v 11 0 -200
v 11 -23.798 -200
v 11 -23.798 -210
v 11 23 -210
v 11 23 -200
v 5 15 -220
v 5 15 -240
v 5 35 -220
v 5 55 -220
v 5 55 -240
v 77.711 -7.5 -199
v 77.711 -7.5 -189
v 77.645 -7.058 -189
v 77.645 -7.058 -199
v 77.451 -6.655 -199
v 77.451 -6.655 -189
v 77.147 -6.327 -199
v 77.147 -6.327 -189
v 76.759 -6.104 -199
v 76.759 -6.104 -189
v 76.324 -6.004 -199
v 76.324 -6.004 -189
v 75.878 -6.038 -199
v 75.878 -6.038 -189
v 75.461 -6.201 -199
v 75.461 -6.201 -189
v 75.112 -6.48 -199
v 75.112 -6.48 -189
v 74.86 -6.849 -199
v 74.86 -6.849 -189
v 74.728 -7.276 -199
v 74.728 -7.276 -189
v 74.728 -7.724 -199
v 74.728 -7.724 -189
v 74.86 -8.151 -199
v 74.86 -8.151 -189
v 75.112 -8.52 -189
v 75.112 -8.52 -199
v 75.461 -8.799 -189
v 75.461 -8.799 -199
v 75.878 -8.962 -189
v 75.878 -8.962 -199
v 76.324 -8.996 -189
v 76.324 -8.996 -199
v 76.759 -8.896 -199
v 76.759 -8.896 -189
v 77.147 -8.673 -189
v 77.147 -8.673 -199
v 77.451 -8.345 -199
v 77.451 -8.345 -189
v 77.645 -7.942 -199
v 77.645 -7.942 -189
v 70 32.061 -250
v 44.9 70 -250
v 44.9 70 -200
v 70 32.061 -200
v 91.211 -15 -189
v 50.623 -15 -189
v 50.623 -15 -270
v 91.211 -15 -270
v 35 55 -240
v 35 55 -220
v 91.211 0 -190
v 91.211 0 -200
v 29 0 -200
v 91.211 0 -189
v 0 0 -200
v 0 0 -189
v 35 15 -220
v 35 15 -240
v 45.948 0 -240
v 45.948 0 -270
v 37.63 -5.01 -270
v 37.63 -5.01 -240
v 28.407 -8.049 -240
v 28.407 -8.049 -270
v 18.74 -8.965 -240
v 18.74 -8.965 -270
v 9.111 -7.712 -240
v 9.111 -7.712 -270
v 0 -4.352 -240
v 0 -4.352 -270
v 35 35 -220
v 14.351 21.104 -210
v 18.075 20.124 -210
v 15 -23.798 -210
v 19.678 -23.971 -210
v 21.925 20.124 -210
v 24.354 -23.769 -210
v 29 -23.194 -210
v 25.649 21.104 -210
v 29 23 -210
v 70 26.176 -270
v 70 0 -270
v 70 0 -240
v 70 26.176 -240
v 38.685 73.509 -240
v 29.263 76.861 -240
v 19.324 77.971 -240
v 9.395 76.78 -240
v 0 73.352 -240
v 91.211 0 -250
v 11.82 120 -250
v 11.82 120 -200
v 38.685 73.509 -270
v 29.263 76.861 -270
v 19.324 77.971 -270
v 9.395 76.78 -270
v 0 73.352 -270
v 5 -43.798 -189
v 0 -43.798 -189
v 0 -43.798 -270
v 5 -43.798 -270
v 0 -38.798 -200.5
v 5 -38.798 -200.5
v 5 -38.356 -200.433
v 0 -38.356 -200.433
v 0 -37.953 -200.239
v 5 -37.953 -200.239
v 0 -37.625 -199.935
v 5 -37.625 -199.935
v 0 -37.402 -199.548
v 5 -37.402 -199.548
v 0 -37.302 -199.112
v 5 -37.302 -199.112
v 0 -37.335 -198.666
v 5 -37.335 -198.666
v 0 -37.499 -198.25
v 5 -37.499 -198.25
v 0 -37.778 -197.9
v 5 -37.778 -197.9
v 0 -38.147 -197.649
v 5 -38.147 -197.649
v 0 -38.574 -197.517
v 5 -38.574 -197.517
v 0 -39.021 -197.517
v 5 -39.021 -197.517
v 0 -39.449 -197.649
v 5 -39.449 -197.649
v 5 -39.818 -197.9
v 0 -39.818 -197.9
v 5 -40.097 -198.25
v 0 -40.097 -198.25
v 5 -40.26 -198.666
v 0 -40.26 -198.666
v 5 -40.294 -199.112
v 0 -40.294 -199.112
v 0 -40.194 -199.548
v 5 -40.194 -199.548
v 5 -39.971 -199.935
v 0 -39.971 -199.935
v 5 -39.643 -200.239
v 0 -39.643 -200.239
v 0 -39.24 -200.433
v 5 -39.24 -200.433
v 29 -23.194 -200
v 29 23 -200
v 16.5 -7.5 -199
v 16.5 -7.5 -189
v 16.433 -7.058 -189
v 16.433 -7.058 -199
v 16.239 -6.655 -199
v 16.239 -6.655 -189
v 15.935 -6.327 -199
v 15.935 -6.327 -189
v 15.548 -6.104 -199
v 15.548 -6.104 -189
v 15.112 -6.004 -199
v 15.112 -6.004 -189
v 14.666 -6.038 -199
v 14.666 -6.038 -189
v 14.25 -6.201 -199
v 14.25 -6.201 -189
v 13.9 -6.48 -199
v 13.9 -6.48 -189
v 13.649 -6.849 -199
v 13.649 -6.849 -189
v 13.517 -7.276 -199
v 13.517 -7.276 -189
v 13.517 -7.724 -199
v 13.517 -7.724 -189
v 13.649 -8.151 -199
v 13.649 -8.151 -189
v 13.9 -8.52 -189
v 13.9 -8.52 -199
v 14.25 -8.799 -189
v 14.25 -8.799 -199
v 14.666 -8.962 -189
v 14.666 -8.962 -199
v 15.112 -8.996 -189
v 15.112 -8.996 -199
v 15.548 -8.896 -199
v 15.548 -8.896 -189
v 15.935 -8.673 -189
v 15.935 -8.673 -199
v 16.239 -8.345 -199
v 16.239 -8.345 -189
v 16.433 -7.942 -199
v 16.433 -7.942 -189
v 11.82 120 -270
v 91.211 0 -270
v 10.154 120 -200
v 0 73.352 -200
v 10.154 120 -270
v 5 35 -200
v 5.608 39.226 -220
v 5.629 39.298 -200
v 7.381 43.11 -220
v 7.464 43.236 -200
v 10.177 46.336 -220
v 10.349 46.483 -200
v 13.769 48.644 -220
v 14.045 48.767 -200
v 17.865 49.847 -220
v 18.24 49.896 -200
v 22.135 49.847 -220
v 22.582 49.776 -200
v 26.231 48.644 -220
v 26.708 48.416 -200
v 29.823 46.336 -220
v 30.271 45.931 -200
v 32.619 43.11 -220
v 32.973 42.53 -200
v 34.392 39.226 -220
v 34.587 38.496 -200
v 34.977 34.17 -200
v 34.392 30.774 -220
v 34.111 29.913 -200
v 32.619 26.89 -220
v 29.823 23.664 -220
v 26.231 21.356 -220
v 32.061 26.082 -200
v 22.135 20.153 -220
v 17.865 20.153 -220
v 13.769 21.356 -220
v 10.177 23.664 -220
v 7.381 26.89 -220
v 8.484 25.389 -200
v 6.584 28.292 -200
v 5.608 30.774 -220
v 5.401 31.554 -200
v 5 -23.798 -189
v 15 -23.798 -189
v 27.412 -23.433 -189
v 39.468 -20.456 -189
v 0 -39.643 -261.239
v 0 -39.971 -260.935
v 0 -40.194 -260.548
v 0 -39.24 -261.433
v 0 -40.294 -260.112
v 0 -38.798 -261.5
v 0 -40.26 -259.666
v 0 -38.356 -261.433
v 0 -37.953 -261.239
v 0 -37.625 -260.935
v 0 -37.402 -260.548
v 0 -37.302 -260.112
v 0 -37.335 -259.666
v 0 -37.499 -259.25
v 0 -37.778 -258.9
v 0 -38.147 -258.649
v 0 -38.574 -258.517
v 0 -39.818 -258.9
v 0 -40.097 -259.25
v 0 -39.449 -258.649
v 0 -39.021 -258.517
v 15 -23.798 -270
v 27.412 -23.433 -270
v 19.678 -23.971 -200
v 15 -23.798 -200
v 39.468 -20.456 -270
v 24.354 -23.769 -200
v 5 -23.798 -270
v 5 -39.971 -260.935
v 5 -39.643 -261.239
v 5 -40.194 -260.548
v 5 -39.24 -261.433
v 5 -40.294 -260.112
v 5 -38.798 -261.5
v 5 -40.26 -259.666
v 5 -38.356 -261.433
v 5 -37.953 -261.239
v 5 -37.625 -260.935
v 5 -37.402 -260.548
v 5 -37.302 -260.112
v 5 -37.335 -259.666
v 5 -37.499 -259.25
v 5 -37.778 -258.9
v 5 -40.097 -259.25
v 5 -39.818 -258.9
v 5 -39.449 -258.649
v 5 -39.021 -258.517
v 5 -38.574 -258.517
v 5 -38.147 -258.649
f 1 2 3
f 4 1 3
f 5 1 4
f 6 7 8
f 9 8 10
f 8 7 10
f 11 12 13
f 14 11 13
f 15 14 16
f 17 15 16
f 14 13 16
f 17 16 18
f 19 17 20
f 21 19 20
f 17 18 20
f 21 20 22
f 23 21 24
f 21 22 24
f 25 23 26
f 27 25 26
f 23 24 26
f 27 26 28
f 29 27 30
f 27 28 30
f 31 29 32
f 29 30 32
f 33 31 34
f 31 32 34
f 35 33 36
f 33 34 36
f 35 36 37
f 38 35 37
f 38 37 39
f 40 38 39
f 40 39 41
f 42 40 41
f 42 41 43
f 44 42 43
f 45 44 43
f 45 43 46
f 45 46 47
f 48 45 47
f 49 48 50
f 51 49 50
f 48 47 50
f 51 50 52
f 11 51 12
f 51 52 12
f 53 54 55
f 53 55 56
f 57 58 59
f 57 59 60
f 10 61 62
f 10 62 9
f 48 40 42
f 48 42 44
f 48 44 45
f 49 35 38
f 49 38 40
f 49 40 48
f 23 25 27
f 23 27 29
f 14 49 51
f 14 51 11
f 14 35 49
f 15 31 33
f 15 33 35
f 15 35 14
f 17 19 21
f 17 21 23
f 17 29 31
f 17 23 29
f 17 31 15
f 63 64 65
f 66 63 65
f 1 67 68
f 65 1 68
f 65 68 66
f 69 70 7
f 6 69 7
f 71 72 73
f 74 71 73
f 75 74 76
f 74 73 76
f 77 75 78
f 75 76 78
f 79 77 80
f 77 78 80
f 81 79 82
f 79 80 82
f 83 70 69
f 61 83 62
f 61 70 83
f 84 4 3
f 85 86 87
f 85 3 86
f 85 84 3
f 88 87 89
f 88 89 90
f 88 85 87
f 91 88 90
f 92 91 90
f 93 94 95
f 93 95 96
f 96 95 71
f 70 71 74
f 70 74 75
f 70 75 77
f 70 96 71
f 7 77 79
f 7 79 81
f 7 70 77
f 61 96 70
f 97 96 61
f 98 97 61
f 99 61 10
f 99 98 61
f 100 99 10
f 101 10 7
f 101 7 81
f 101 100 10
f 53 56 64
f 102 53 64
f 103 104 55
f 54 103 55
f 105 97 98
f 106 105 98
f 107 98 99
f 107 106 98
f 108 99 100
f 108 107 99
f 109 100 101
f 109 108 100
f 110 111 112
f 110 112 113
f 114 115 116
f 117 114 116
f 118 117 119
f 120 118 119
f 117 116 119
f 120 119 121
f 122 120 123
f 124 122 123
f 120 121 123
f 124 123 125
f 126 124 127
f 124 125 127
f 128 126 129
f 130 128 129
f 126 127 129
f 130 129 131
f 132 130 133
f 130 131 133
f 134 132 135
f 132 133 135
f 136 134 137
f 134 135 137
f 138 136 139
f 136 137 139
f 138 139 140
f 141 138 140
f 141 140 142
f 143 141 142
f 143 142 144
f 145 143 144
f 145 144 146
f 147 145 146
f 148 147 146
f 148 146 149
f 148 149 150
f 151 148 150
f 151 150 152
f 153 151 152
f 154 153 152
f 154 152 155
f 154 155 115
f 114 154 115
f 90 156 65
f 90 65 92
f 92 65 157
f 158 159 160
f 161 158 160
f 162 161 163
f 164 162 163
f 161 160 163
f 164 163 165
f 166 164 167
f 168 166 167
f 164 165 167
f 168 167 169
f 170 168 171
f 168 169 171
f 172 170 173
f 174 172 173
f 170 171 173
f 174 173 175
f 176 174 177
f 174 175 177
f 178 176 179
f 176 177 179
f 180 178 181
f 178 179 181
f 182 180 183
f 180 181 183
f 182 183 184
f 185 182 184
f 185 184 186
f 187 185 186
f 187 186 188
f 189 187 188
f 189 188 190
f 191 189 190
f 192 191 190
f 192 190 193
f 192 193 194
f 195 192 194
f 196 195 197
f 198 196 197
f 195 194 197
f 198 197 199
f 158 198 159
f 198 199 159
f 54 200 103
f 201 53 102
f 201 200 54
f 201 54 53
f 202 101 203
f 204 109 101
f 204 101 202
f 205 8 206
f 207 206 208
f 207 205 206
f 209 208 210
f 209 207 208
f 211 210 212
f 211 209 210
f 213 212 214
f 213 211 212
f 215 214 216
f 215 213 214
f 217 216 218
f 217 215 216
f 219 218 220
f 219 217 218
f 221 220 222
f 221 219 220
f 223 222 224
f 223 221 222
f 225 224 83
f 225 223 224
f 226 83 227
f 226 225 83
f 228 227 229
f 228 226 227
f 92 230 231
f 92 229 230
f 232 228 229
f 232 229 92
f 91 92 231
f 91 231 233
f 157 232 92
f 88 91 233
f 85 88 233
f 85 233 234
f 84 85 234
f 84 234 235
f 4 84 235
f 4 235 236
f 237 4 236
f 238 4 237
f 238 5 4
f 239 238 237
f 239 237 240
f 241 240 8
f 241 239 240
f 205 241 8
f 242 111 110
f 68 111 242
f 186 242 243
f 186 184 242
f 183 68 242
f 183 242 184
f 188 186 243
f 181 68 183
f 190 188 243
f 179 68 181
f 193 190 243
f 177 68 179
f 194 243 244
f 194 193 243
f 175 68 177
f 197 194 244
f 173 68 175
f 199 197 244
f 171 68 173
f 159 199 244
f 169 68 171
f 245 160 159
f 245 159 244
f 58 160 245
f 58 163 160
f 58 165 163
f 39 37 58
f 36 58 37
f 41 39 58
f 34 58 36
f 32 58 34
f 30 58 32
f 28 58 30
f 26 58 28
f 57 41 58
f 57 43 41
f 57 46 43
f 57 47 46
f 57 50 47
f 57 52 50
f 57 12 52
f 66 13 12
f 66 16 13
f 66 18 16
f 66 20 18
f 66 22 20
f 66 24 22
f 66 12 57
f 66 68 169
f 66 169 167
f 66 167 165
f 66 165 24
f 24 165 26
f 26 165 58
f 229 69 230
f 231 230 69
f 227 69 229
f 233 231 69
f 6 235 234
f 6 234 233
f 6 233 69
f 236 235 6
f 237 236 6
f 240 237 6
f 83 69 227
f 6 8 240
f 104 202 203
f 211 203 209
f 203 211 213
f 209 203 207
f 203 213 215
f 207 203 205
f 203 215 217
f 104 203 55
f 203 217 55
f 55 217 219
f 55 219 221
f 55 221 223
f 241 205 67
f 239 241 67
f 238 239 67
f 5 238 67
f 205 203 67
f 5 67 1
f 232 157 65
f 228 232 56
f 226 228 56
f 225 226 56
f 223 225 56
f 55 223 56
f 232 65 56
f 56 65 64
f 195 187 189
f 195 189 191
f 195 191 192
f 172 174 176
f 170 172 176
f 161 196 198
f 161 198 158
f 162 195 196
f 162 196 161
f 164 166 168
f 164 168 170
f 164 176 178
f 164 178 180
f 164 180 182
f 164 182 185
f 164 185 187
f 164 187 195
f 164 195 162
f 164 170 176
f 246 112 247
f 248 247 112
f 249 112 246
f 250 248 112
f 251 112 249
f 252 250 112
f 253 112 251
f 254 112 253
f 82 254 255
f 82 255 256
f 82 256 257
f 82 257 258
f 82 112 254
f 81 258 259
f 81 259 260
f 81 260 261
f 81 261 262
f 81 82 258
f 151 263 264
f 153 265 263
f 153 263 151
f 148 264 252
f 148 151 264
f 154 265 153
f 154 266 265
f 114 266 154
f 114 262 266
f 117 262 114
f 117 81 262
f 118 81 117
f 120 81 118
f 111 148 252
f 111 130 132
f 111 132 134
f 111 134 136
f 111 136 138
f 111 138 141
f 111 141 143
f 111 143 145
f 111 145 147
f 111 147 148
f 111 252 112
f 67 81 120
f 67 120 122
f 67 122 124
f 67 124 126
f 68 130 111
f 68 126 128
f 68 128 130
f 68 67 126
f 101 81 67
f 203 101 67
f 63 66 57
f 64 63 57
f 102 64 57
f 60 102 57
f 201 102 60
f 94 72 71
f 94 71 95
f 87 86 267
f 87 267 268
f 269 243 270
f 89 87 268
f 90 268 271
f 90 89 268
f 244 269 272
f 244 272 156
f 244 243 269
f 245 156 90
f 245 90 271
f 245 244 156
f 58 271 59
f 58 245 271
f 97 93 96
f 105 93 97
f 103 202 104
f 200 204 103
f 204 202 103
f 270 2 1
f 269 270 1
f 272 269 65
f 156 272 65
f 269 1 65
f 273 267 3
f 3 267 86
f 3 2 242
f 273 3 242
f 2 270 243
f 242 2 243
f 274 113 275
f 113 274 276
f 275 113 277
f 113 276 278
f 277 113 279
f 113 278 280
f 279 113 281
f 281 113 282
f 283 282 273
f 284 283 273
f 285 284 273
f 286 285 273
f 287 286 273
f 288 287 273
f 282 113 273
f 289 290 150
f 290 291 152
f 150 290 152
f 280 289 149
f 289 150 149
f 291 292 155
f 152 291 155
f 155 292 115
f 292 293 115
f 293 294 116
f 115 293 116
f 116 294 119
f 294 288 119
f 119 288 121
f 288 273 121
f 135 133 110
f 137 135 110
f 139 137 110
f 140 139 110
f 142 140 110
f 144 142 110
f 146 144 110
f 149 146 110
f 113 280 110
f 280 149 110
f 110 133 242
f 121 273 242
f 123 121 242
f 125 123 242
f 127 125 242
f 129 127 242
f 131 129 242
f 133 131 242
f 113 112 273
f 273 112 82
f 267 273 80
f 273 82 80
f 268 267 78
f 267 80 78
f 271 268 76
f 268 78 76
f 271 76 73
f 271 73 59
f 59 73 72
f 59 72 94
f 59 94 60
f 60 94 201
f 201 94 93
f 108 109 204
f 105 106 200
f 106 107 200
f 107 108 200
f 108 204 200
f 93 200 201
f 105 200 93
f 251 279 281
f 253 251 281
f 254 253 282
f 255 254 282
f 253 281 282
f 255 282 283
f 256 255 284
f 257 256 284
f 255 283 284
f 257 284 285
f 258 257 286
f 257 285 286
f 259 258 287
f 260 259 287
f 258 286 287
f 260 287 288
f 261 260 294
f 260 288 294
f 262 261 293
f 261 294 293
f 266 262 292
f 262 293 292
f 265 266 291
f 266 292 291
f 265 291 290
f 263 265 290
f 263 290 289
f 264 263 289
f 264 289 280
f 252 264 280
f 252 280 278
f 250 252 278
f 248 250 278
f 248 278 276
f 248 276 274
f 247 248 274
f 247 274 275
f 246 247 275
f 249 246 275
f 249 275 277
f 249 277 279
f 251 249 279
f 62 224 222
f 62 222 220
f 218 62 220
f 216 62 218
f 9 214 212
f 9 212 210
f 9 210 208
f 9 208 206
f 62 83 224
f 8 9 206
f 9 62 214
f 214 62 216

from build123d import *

# Parameters (mm, degrees)
EXTRUDE_1_DEPTH           = 30
EXTRUDE_2_DEPTH           = 210
SKETCH_8_W                = 25
SKETCH_8_H                = 120
EXTRUDE_5_DEPTH           = 70
SKETCH_9_W                = 25
SKETCH_9_H                = 60
EXTRUDE_6_DEPTH           = 60
SKETCH_10_R               = 7.5
CUT_EXTRUDE_3_DEPTH       = 402.372644808
EXTRUDE_7_DEPTH           = 60
EXTRUDE_8_REACH           = 392.16
SKETCH_12_R               = 2.5
SKETCH_14_W               = 125
SKETCH_14_H               = 50
EXTRUDE_9_DEPTH           = 120
SKETCH_15_W               = 70
SKETCH_15_H               = 70
CUT_EXTRUDE_4_DEPTH       = 10
CUT_EXTRUDE_5_DEPTH       = 20
SKETCH_17_R               = 43.471266984
CUT_EXTRUDE_6_DEPTH       = 428.317212384
EXTRUDE_10_DEPTH          = 20
EXTRUDE_11_DEPTH          = 20
CUT_EXTRUDE_7_DEPTH       = 434.012701892
CUT_EXTRUDE_8_DEPTH       = 434.012701892
EXTRUDE_19_REACH          = 446.86
EXTRUDE_20_DEPTH          = 20
EXTRUDE_21_DEPTH          = 20
EXTRUDE_START             = 20
EXTRUDE_22_DEPTH          = 20
CUT_EXTRUDE_9_DEPTH       = 30
CUT_EXTRUDE_11_DEPTH      = 407.201920232
CUT_EXTRUDE_11_DEPTH_BACK = 407.201920232
SKETCH_29_R               = 15
EXTRUDE_23_DEPTH          = 78.203243
SKETCH_33_W               = 30
SKETCH_33_H               = 40
CUT_EXTRUDE_14_DEPTH      = 20
SKETCH_34_W               = 18
SKETCH_34_H               = 35.300600551
CUT_EXTRUDE_15_DEPTH      = 10
CUT_EXTRUDE_16_DEPTH      = 10
SKETCH_36_RX              = 24.05
SKETCH_36_RY              = 15.9
SKETCH_36_R               = 15.9
CUT_EXTRUDE_17_DEPTH      = 4
SKETCH_37_W               = 148.788525811
SKETCH_37_H               = 80
CUT_EXTRUDE_18_DEPTH      = 445.859528391
SKETCH_38_W               = 76.211474189
SKETCH_38_H               = 51.3
CUT_EXTRUDE_20_DEPTH      = 80
CUT_EXTRUDE_START         = -81
CUT_EXTRUDE_21_DEPTH      = 81
CUT_EXTRUDE_22_DEPTH      = 402.372644808
SKETCH_41_W               = 18
SKETCH_41_H               = 10
CUT_EXTRUDE_23_DEPTH      = 60
SKETCH_44_W               = 50
SKETCH_44_H               = 109
EXTRUDE_26_DEPTH          = 15
SKETCH_45_W               = 50
SKETCH_45_H               = 109
EXTRUDE_27_DEPTH          = 15
EXTRUDE_28_DEPTH          = 15
SKETCH_47_W               = 15
SKETCH_47_H               = 50.339258453
CUT_EXTRUDE_24_DEPTH      = 109
CUT_EXTRUDE_27_DEPTH      = 400.249295554
CUT_EXTRUDE_27_DEPTH_BACK = 400.249295554
CUT_EXTRUDE_28_DEPTH      = 435.539986653
CUT_EXTRUDE_28_DEPTH_BACK = 435.539986653
CUT_EXTRUDE_29_DEPTH      = 323.795419456
CUT_EXTRUDE_29_DEPTH_BACK = 15
SKETCH_56_W               = 81
SKETCH_56_H               = 139.588324269
SKETCH_57_W               = 5
SKETCH_57_H               = 81
EXTRUDE_30_DEPTH          = 20
SKETCH_58_R               = 1.5
CUT_EXTRUDE_30_DEPTH      = 20
SKETCH_59_R               = 1.5
CUT_EXTRUDE_31_DEPTH      = 10


with BuildPart() as part:
    # 草图1 → 凸台-拉伸1 (new body)
    with BuildSketch(Plane(origin=(0, 0, 0), x_dir=(0, 0, -1), z_dir=(1, 0, 0))):
        with BuildLine():
            Line((0, 0), (270, 0))
            Line((270, 0), (270, -100.282814983))
            ThreePointArc((270, -100.282814983), (264.178138298, -118.691056762), (248.830033233, -130.404003019))
            Line((248.830033233, -130.404003019), (142.45524498, -168.69892679))
            ThreePointArc((142.45524498, -168.69892679), (135, -170), (127.54475502, -168.69892679))
            Line((127.54475502, -168.69892679), (21.169966767, -130.404003019))
            ThreePointArc((21.169966767, -130.404003019), (5.821861702, -118.691056762), (0, -100.282814983))
            Line((0, -100.282814983), (0, 0))
        make_face()
    extrude(amount=EXTRUDE_1_DEPTH)

    # 草图2 → 凸台-拉伸2 (add)
    with BuildSketch(Plane(origin=(30, 0, 0), x_dir=(0, 0, -1), z_dir=(1, 0, 0))):
        with BuildLine():
            Line((105, -160.582814983), (105, 0))
            Line((105, 0), (0, 0))
            Line((0, 0), (0, -100.282814983))
            ThreePointArc((0, -100.282814983), (5.821861702, -118.691056762), (21.169966767, -130.404003019))
            Line((21.169966767, -130.404003019), (105, -160.582814983))
        make_face()
        with BuildLine():
            Line((270, 0), (165, 0))
            Line((165, 0), (165, -160.582814983))
            Line((165, -160.582814983), (248.830033233, -130.404003019))
            ThreePointArc((248.830033233, -130.404003019), (264.178138298, -118.691056762), (270, -100.282814983))
            Line((270, -100.282814983), (270, 0))
        make_face()
    extrude(amount=EXTRUDE_2_DEPTH)

    # 草图8 → 凸台-拉伸5 (add)
    with BuildSketch(Plane(origin=(240, 0, 0), x_dir=(0, 0, -1), z_dir=(1, 0, 0))):
        with Locations((92.5, 0)):
            Rectangle(SKETCH_8_W, SKETCH_8_H)
        with Locations((177.5, 0)):
            Rectangle(SKETCH_8_W, SKETCH_8_H)
    extrude(amount=EXTRUDE_5_DEPTH)

    # 草图9 → 凸台-拉伸6 (add)
    with BuildSketch(Plane.ZY.offset(-240)):
        with Locations((-92.5, 30)):
            Rectangle(SKETCH_9_W, SKETCH_9_H)
        with Locations((-177.5, 30)):
            Rectangle(SKETCH_9_W, SKETCH_9_H)
    extrude(amount=EXTRUDE_6_DEPTH)

    # 草图10 → 切除-拉伸3 (cut, through all)
    with BuildSketch(Plane.XY.offset(-80)):
        with Locations((270, 30)):
            Circle(SKETCH_10_R)
    extrude(amount=-CUT_EXTRUDE_3_DEPTH, mode=Mode.SUBTRACT)

    # 草图11 → 凸台-拉伸7 (add)
    with BuildSketch(Plane(origin=(0, 0, -105), x_dir=(-1, 0, 0), z_dir=(0, 0, -1))):
        with BuildLine():
            Line((-30, -40), (-30, -160.582814983))
            Line((-30, -160.582814983), (-108.203242822, -160.582814983))
            ThreePointArc((-108.203242822, -160.582814983), (-60.24964282, -106.032303748), (-30, -40))
        make_face()
    extrude(amount=EXTRUDE_7_DEPTH)

    # 草图12 → 凸台-拉伸8 (add, up to next)
    with BuildSketch(Plane.XY.offset(-165), mode=Mode.PRIVATE) as extrude_8_sk1:
        with Locations(Location((70, -45, 0), (0, 0, 180))):
            Circle(SKETCH_12_R)
    extrude_8_tool1 = extrude(extrude_8_sk1.sketch, amount=EXTRUDE_8_REACH, mode=Mode.PRIVATE) - part.part
    add(extrude_8_tool1.solids().sort_by_distance((70, -45, -165))[0])

    # 草图14 → 凸台-拉伸9 (add)
    with BuildSketch(Plane(origin=(0, 0, 0), x_dir=(1, 0, 0), z_dir=(0, 1, 0))):
        with Locations((62.5, 225)):
            Rectangle(SKETCH_14_W, SKETCH_14_H)
        with Locations((62.5, 45)):
            Rectangle(SKETCH_14_W, SKETCH_14_H)
    extrude(amount=EXTRUDE_9_DEPTH)

    # 草图15 → 切除-拉伸4 (cut)
    with BuildSketch(Plane.XY.offset(-20)):
        with Locations((35, 35)):
            Rectangle(SKETCH_15_W, SKETCH_15_H)
    extrude(amount=-CUT_EXTRUDE_4_DEPTH, mode=Mode.SUBTRACT)

    # 草图16 → 切除-拉伸5 (cut)
    with BuildSketch(Plane.XY.offset(-30)):
        Polygon((35, 15), (5, 15), (5, 55), (35, 55), (35, 35), align=None)
    extrude(amount=-CUT_EXTRUDE_5_DEPTH, mode=Mode.SUBTRACT)

    # 草图17 → 切除-拉伸6 (cut, through all)
    with BuildSketch(Plane.XY.offset(-30)):
        with Locations((19.5, 34.5)):
            Circle(SKETCH_17_R)
    extrude(amount=CUT_EXTRUDE_6_DEPTH, mode=Mode.SUBTRACT)

    # 草图18 → 凸台-拉伸10 (add)
    with BuildSketch(Plane.XY.offset(-20)):
        Polygon((11.819921283, 120), (91.211474189, 0), (87.317867735, 0), (10.741661946, 115.744614613), align=None)
    extrude(amount=EXTRUDE_10_DEPTH)

    # 草图19 → 凸台-拉伸11 (add)
    with BuildSketch(Plane.XY.offset(-20)):
        with BuildLine():
            Line((1.857343832, 74.230186717), (10.856035233, 115.571739869))
            Line((10.856035233, 115.571739869), (10.741661946, 115.744614613))
            Line((10.741661946, 115.744614613), (11.819921283, 120))
            Line((11.819921283, 120), (10.153664863, 120))
            Line((10.153664863, 120), (0, 73.352297914))
            ThreePointArc((0, 73.352297914), (0.923485284, 73.80221564), (1.857343832, 74.230186717))
        make_face()
    extrude(amount=EXTRUDE_11_DEPTH)

    # 草图20 → 切除-拉伸7 (cut, through all)
    with BuildSketch(Plane.XY.offset(-20)):
        Polygon((0, 120), (0, 73.352297914), (10.153664863, 120), align=None)
    extrude(amount=-CUT_EXTRUDE_7_DEPTH, mode=Mode.SUBTRACT)

    # 草图22 → 切除-拉伸8 (cut, through all)
    with BuildSketch(Plane.XY.offset(-20)):
        Polygon((44.899734993, 70), (70, 32.061054476), (91.211474189, 0), (125, 0), (125, 120), (11.819921283, 120), align=None)
    extrude(amount=-CUT_EXTRUDE_8_DEPTH, mode=Mode.SUBTRACT)

    # 草图23 → 凸台-拉伸19 (add, up to next)
    with BuildSketch(Plane.XY, mode=Mode.PRIVATE) as extrude_19_sk1:
        with BuildLine():
            Line((87.317867735, 0), (91.211474189, 0))
            Line((91.211474189, 0), (11.819921283, 120))
            Line((11.819921283, 120), (10.153664863, 120))
            Line((10.153664863, 120), (0, 73.352297914))
            ThreePointArc((0, 73.352297914), (0.923485284, 73.80221564), (1.857343832, 74.230186717))
            Line((1.857343832, 74.230186717), (10.856035233, 115.571739869))
            Line((10.856035233, 115.571739869), (87.317867735, 0))
        make_face()
    extrude_19_tool1 = extrude(extrude_19_sk1.sketch, amount=-EXTRUDE_19_REACH, mode=Mode.PRIVATE) - part.part
    add(extrude_19_tool1.solids().sort_by_distance((89.264671, 1.5073, 0))[0])

    # 草图24 → 凸台-拉伸20 (add)
    with BuildSketch(Plane.XY.offset(-20)):
        Polygon((87.317867735, 0), (70, 26.175884614), (70, 0), align=None)
    extrude(amount=EXTRUDE_20_DEPTH)

    # 草图25 → 凸台-拉伸21 (add)
    with BuildSketch(Plane.XY.offset(-20)):
        with BuildLine():
            Line((38.684579851, 73.509011127), (10.856035233, 115.571739869))
            Line((10.856035233, 115.571739869), (1.857343832, 74.230186717))
            ThreePointArc((1.857343832, 74.230186717), (20.351120273, 77.962934179), (38.684579851, 73.509011127))
        make_face()
    extrude(amount=EXTRUDE_21_DEPTH)

    # 草图26 → 凸台-拉伸22 (add)
    with BuildSketch(Plane(origin=(0, 0, -250), x_dir=(-1, 0, 0), z_dir=(0, 0, -1)).offset(EXTRUDE_START)):
        with BuildLine():
            Line((-70, 26.175884614), (-38.684579851, 73.509011127))
            ThreePointArc((-38.684579851, 73.509011127), (-19.323897117, 77.970910285), (0, 73.352297914))
            Line((0, 73.352297914), (-10.153664863, 120))
            Line((-10.153664863, 120), (-11.819921283, 120))
            Line((-11.819921283, 120), (-91.211474189, 0))
            Line((-91.211474189, 0), (-240, 0))
            Line((-240, 0), (-240, -100.282814983))
            Line((-240, -100.282814983), (0, -100.282814983))
            Line((0, -100.282814983), (0, -4.352297914))
            ThreePointArc((0, -4.352297914), (-23.599339693, -8.77755154), (-45.948082222, 0))
            Line((-45.948082222, 0), (-70, 0))
            Line((-70, 0), (-70, 26.175884614))
        make_face()
    extrude(amount=-EXTRUDE_22_DEPTH)

    # 草图27 → 切除-拉伸9 (cut)
    with BuildSketch(Plane(origin=(0, 0, -270), x_dir=(-1, 0, 0), z_dir=(0, 0, -1))):
        with BuildLine():
            Line((-38.684579851, 73.509011127), (-70, 26.175884614))
            Line((-70, 26.175884614), (-70, 0))
            Line((-70, 0), (-45.948082222, 0))
            ThreePointArc((-45.948082222, 0), (-23.599339693, -8.77755154), (0, -4.352297914))
            Line((0, -4.352297914), (0, 73.352297914))
            ThreePointArc((0, 73.352297914), (-19.323897117, 77.970910285), (-38.684579851, 73.509011127))
        make_face()
    extrude(amount=-CUT_EXTRUDE_9_DEPTH, mode=Mode.SUBTRACT)

    # 草图29 → 切除-拉伸11 (cut, two sides: drawn at the far end of the back side and taken through both)
    with BuildSketch(Plane(origin=(0, 0, -70), x_dir=(-1, 0, 0), z_dir=(0, 0, -1)).offset(-CUT_EXTRUDE_11_DEPTH_BACK)):
        with Locations((-20, 35)):
            Circle(SKETCH_29_R)
    extrude(amount=CUT_EXTRUDE_11_DEPTH + CUT_EXTRUDE_11_DEPTH_BACK, mode=Mode.SUBTRACT)

    # 草图30 → 凸台-拉伸23 (add)
    with BuildSketch(Plane(origin=(30, 0, 0), x_dir=(0, 0, -1), z_dir=(1, 0, 0))):
        with BuildLine():
            Line((142.45524498, -168.69892679), (165, -160.582814983))
            Line((165, -160.582814983), (105, -160.582814983))
            Line((105, -160.582814983), (127.54475502, -168.69892679))
            ThreePointArc((127.54475502, -168.69892679), (135, -170), (142.45524498, -168.69892679))
        make_face()
    extrude(amount=EXTRUDE_23_DEPTH)

    # 草图33 → 切除-拉伸14 (cut)
    with BuildSketch(Plane(origin=(0, 0, -240), x_dir=(-1, 0, 0), z_dir=(0, 0, -1))):
        with Locations((-20, 35)):
            Rectangle(SKETCH_33_W, SKETCH_33_H)
    extrude(amount=-CUT_EXTRUDE_14_DEPTH, mode=Mode.SUBTRACT)

    # 草图34 → 切除-拉伸15 (cut)
    with BuildSketch(Plane.XY.offset(-200)):
        with Locations((20, 17.650300276)):
            Rectangle(SKETCH_34_W, SKETCH_34_H)
    extrude(amount=-CUT_EXTRUDE_15_DEPTH, mode=Mode.SUBTRACT)

    # 草图35 → 切除-拉伸16 (cut)
    with BuildSketch(Plane(origin=(0, 0, -70), x_dir=(-1, 0, 0), z_dir=(0, 0, -1))):
        with BuildLine():
            Line((-11, 0), (-11, 23))
            ThreePointArc((-11, 23), (-20, 20), (-29, 23))
            Line((-29, 23), (-29, 0))
            Line((-29, 0), (-11, 0))
        make_face()
    extrude(amount=-CUT_EXTRUDE_16_DEPTH, mode=Mode.SUBTRACT)

    # 草图36 → 切除-拉伸17 (cut)
    # profile 1 of 6: a face of its own
    with BuildSketch(Plane.ZY):
        with Locations((-235.69166945, -100.008005659)):
            Ellipse(SKETCH_36_RX, SKETCH_36_RY)
        with Locations((-235.69166945, -100.008005659)):
            Circle(SKETCH_36_R, mode=Mode.SUBTRACT)
    # profile 2 of 6: a face of its own
    with BuildSketch(Plane.ZY):
        with Locations((-235.69166945, -100.008005659)):
            Ellipse(SKETCH_36_RX, SKETCH_36_RY)
        with Locations((-235.69166945, -100.008005659)):
            Circle(SKETCH_36_R, mode=Mode.SUBTRACT)
    # profile 3 of 6: a face of its own
    with BuildSketch(Plane.ZY):
        with Locations((-235.69166945, -100.008005659)):
            Circle(SKETCH_36_R)
    # profile 4 of 6: a face of its own
    with BuildSketch(Plane.ZY):
        with Locations(Location((-34.30833055, -100.008005659), (0, 0, 180))):
            Ellipse(SKETCH_36_RX, SKETCH_36_RY)
        with Locations((-34.30833055, -100.008005659)):
            Circle(SKETCH_36_R, mode=Mode.SUBTRACT)
    # profile 5 of 6: a face of its own
    with BuildSketch(Plane.ZY):
        with Locations(Location((-34.30833055, -100.008005659), (0, 0, 180))):
            Ellipse(SKETCH_36_RX, SKETCH_36_RY)
        with Locations((-34.30833055, -100.008005659)):
            Circle(SKETCH_36_R, mode=Mode.SUBTRACT)
    # profile 6 of 6: a face of its own
    with BuildSketch(Plane.ZY):
        with Locations((-34.30833055, -100.008005659)):
            Circle(SKETCH_36_R)
    extrude(amount=-CUT_EXTRUDE_17_DEPTH, mode=Mode.SUBTRACT)

    # 草图37 → 切除-拉伸18 (cut, through all)
    with BuildSketch(Plane(origin=(0, 0, 0), x_dir=(1, 0, 0), z_dir=(0, 1, 0))):
        with Locations((165.605737095, 40)):
            Rectangle(SKETCH_37_W, SKETCH_37_H)
        with Locations((165.605737095, 230)):
            Rectangle(SKETCH_37_W, SKETCH_37_H)
    extrude(amount=-CUT_EXTRUDE_18_DEPTH, mode=Mode.SUBTRACT)

    # 草图38 → 切除-拉伸20 (cut)
    with BuildSketch(Plane.XY):
        with Locations((53.105737095, -125.932814983)):
            Rectangle(SKETCH_38_W, SKETCH_38_H)
        Polygon((91.211474189, -15), (76.211474189, -15), (76.211474189, -85.282814983), (15, -85.282814983), (15, -100.282814983), (91.211474189, -100.282814983), align=None)
        with BuildLine():
            ThreePointArc((15, -23.79784784), (33.51949079, -22.265684535), (50.622966805, -15))
            Line((50.622966805, -15), (70, -15))
            Line((70, -15), (76.211474189, -15))
            Line((76.211474189, -15), (76.211474189, -85.282814983))
            Line((76.211474189, -85.282814983), (15, -85.282814983))
            Line((15, -85.282814983), (15, -23.79784784))
        make_face()
    extrude(amount=-CUT_EXTRUDE_20_DEPTH, mode=Mode.SUBTRACT)

    # 草图39 → 切除-拉伸21 (cut)
    with BuildSketch(Plane(origin=(0, 0, -270), x_dir=(-1, 0, 0), z_dir=(0, 0, -1)).offset(CUT_EXTRUDE_START)):
        with BuildLine():
            Line((-180, 60), (-310, 60))
            Line((-310, 60), (-310, -60))
            Line((-310, -60), (-240, -60))
            Line((-240, -60), (-240, -151.582814983))
            Line((-240, -151.582814983), (-15, -151.582814983))
            Line((-15, -151.582814983), (-15, -23.79784784))
            ThreePointArc((-15, -23.79784784), (-33.51949079, -22.265684535), (-50.622966805, -15))
            Line((-50.622966805, -15), (-91.211474189, -15))
            Line((-91.211474189, -15), (-91.211474189, 0))
            Line((-91.211474189, 0), (-180, 0))
            Line((-180, 0), (-180, 60))
        make_face()
    extrude(amount=CUT_EXTRUDE_21_DEPTH, mode=Mode.SUBTRACT)

    # 草图40 → 切除-拉伸22 (cut, through all)
    with BuildSketch(Plane.XY.offset(-80)):
        with BuildLine():
            Line((74.655848302, -141.582814983), (40, -141.582814983))
            Line((40, -141.582814983), (40, -91.24355653))
            ThreePointArc((40, -91.24355653), (55.843697078, -117.43499557), (74.655848302, -141.582814983))
        make_face()
    extrude(amount=-CUT_EXTRUDE_22_DEPTH, mode=Mode.SUBTRACT)

    # 草图41 → 切除-拉伸23 (cut)
    with BuildSketch(Plane(origin=(0, 0, 0), x_dir=(1, 0, 0), z_dir=(0, 1, 0))):
        with Locations((20, 65)):
            Rectangle(SKETCH_41_W, SKETCH_41_H)
        with Locations((20, 205)):
            Rectangle(SKETCH_41_W, SKETCH_41_H)
    extrude(amount=-CUT_EXTRUDE_23_DEPTH, mode=Mode.SUBTRACT)

    # 草图44 → 凸台-拉伸26 (add)
    with BuildSketch(Plane(origin=(0, 60, 0), x_dir=(1, 0, 0), z_dir=(0, 1, 0))):
        with Locations((285, 134.5)):
            Rectangle(SKETCH_44_W, SKETCH_44_H)
    extrude(amount=EXTRUDE_26_DEPTH)

    # 草图45 → 凸台-拉伸27 (add)
    with BuildSketch(Plane.XZ.offset(60)):
        with Locations((285, -134.5)):
            Rectangle(SKETCH_45_W, SKETCH_45_H)
    extrude(amount=EXTRUDE_27_DEPTH)

    # 草图46 → 凸台-拉伸28 (add)
    with BuildSketch(Plane(origin=(240, 0, 0), x_dir=(0, 0, -1), z_dir=(1, 0, 0))):
        Polygon((80, -151.582814983), (105, -160.582814983), (165, -160.582814983), (189, -151.942814983), (189, -130.582814983), (80, -130.582814983), align=None)
    extrude(amount=EXTRUDE_28_DEPTH)

    # 草图47 → 切除-拉伸24 (cut)
    with BuildSketch(Plane(origin=(0, 0, -189), x_dir=(-1, 0, 0), z_dir=(0, 0, -1))):
        with Locations((-32.5, -116.413185757)):
            Rectangle(SKETCH_47_W, SKETCH_47_H)
    extrude(amount=-CUT_EXTRUDE_24_DEPTH, mode=Mode.SUBTRACT)

    # 草图51 → 切除-拉伸27 (cut, two sides: drawn at the far end of the back side and taken through both)
    with BuildSketch(Plane(origin=(240, 0, 0), x_dir=(0, 0, -1), z_dir=(1, 0, 0)).offset(-CUT_EXTRUDE_27_DEPTH_BACK)):
        Polygon((190, -151.582814983), (189, -151.582814983), (189, -151.942814983), align=None)
    extrude(amount=CUT_EXTRUDE_27_DEPTH + CUT_EXTRUDE_27_DEPTH_BACK, mode=Mode.SUBTRACT)

    # 草图48 → 切除-拉伸28 (cut, two sides: drawn at the far end of the back side and taken through both)
    with BuildSketch(Plane(origin=(15, 0, 0), x_dir=(0, 0, -1), z_dir=(1, 0, 0)).offset(-CUT_EXTRUDE_28_DEPTH_BACK)):
        Polygon((0, 72.29617301), (70, 73.297590414), (70, 120), (0, 120), align=None)
        Polygon((70, 73.297590414), (189, 75), (189, 120), (70, 120), align=None)
        Polygon((70, 0), (70, 73.297590414), (0, 72.29617301), (0, 0), align=None)
        with BuildLine():
            Line((189, -151.582814983), (189, -23.79784784))
            Line((189, -23.79784784), (189, 75))
            Line((189, 75), (70, 73.297590414))
            Line((70, 73.297590414), (70, 0))
            Line((70, 0), (0, 0))
            Line((0, 0), (0, -23.79784784))
            Line((0, -23.79784784), (60, -23.79784784))
            Line((60, -23.79784784), (60, -60))
            Line((60, -60), (70, -60))
            Line((70, -60), (70, -23.79784784))
            Line((70, -23.79784784), (80, -23.79784784))
            Line((80, -23.79784784), (80, -151.582814983))
            Line((80, -151.582814983), (21.169966767, -130.404003019))
            ThreePointArc((21.169966767, -130.404003019), (5.821861702, -118.691056762), (0, -100.282814983))
            Line((0, -100.282814983), (0, -180.746423956))
            Line((0, -180.746423956), (189, -180.746423956))
            Line((189, -180.746423956), (189, -151.582814983))
        make_face()
        with BuildLine():
            Line((0, -23.79784784), (0, -100.282814983))
            ThreePointArc((0, -100.282814983), (5.821861702, -118.691056762), (21.169966767, -130.404003019))
            Line((21.169966767, -130.404003019), (80, -151.582814983))
            Line((80, -151.582814983), (80, -23.79784784))
            Line((80, -23.79784784), (70, -23.79784784))
            Line((70, -23.79784784), (70, -60))
            Line((70, -60), (60, -60))
            Line((60, -60), (60, -23.79784784))
            Line((60, -23.79784784), (0, -23.79784784))
        make_face()
    extrude(amount=CUT_EXTRUDE_28_DEPTH + CUT_EXTRUDE_28_DEPTH_BACK, mode=Mode.SUBTRACT)

    # 草图56 → 切除-拉伸29 (cut, two sides: drawn at the far end of the back side and taken through both)
    with BuildSketch(Plane.ZY.offset(-CUT_EXTRUDE_29_DEPTH_BACK)):
        with Locations((-229.5, -93.592009975)):
            Rectangle(SKETCH_56_W, SKETCH_56_H)
    extrude(amount=CUT_EXTRUDE_29_DEPTH + CUT_EXTRUDE_29_DEPTH_BACK, mode=Mode.SUBTRACT)

    # 草图57 → 凸台-拉伸30 (add)
    with BuildSketch(Plane.XZ.offset(23.79784784)):
        with Locations((2.5, -229.5)):
            Rectangle(SKETCH_57_W, SKETCH_57_H)
    extrude(amount=EXTRUDE_30_DEPTH)

    # 草图58 → 切除-拉伸30 (cut)
    with BuildSketch(Plane(origin=(5, 0, 0), x_dir=(0, 0, -1), z_dir=(1, 0, 0))):
        with Locations((260, -38.79784784)):
            Circle(SKETCH_58_R)
        with Locations((199, -38.79784784)):
            Circle(SKETCH_58_R)
    extrude(amount=-CUT_EXTRUDE_30_DEPTH, mode=Mode.SUBTRACT)

    # 草图59 → 切除-拉伸31 (cut)
    with BuildSketch(Plane.XY.offset(-189)):
        with Locations((15, -7.5)):
            Circle(SKETCH_59_R)
        with Locations((76.211474189, -7.5)):
            Circle(SKETCH_59_R)
    extrude(amount=-CUT_EXTRUDE_31_DEPTH, mode=Mode.SUBTRACT)


solid = part.part
